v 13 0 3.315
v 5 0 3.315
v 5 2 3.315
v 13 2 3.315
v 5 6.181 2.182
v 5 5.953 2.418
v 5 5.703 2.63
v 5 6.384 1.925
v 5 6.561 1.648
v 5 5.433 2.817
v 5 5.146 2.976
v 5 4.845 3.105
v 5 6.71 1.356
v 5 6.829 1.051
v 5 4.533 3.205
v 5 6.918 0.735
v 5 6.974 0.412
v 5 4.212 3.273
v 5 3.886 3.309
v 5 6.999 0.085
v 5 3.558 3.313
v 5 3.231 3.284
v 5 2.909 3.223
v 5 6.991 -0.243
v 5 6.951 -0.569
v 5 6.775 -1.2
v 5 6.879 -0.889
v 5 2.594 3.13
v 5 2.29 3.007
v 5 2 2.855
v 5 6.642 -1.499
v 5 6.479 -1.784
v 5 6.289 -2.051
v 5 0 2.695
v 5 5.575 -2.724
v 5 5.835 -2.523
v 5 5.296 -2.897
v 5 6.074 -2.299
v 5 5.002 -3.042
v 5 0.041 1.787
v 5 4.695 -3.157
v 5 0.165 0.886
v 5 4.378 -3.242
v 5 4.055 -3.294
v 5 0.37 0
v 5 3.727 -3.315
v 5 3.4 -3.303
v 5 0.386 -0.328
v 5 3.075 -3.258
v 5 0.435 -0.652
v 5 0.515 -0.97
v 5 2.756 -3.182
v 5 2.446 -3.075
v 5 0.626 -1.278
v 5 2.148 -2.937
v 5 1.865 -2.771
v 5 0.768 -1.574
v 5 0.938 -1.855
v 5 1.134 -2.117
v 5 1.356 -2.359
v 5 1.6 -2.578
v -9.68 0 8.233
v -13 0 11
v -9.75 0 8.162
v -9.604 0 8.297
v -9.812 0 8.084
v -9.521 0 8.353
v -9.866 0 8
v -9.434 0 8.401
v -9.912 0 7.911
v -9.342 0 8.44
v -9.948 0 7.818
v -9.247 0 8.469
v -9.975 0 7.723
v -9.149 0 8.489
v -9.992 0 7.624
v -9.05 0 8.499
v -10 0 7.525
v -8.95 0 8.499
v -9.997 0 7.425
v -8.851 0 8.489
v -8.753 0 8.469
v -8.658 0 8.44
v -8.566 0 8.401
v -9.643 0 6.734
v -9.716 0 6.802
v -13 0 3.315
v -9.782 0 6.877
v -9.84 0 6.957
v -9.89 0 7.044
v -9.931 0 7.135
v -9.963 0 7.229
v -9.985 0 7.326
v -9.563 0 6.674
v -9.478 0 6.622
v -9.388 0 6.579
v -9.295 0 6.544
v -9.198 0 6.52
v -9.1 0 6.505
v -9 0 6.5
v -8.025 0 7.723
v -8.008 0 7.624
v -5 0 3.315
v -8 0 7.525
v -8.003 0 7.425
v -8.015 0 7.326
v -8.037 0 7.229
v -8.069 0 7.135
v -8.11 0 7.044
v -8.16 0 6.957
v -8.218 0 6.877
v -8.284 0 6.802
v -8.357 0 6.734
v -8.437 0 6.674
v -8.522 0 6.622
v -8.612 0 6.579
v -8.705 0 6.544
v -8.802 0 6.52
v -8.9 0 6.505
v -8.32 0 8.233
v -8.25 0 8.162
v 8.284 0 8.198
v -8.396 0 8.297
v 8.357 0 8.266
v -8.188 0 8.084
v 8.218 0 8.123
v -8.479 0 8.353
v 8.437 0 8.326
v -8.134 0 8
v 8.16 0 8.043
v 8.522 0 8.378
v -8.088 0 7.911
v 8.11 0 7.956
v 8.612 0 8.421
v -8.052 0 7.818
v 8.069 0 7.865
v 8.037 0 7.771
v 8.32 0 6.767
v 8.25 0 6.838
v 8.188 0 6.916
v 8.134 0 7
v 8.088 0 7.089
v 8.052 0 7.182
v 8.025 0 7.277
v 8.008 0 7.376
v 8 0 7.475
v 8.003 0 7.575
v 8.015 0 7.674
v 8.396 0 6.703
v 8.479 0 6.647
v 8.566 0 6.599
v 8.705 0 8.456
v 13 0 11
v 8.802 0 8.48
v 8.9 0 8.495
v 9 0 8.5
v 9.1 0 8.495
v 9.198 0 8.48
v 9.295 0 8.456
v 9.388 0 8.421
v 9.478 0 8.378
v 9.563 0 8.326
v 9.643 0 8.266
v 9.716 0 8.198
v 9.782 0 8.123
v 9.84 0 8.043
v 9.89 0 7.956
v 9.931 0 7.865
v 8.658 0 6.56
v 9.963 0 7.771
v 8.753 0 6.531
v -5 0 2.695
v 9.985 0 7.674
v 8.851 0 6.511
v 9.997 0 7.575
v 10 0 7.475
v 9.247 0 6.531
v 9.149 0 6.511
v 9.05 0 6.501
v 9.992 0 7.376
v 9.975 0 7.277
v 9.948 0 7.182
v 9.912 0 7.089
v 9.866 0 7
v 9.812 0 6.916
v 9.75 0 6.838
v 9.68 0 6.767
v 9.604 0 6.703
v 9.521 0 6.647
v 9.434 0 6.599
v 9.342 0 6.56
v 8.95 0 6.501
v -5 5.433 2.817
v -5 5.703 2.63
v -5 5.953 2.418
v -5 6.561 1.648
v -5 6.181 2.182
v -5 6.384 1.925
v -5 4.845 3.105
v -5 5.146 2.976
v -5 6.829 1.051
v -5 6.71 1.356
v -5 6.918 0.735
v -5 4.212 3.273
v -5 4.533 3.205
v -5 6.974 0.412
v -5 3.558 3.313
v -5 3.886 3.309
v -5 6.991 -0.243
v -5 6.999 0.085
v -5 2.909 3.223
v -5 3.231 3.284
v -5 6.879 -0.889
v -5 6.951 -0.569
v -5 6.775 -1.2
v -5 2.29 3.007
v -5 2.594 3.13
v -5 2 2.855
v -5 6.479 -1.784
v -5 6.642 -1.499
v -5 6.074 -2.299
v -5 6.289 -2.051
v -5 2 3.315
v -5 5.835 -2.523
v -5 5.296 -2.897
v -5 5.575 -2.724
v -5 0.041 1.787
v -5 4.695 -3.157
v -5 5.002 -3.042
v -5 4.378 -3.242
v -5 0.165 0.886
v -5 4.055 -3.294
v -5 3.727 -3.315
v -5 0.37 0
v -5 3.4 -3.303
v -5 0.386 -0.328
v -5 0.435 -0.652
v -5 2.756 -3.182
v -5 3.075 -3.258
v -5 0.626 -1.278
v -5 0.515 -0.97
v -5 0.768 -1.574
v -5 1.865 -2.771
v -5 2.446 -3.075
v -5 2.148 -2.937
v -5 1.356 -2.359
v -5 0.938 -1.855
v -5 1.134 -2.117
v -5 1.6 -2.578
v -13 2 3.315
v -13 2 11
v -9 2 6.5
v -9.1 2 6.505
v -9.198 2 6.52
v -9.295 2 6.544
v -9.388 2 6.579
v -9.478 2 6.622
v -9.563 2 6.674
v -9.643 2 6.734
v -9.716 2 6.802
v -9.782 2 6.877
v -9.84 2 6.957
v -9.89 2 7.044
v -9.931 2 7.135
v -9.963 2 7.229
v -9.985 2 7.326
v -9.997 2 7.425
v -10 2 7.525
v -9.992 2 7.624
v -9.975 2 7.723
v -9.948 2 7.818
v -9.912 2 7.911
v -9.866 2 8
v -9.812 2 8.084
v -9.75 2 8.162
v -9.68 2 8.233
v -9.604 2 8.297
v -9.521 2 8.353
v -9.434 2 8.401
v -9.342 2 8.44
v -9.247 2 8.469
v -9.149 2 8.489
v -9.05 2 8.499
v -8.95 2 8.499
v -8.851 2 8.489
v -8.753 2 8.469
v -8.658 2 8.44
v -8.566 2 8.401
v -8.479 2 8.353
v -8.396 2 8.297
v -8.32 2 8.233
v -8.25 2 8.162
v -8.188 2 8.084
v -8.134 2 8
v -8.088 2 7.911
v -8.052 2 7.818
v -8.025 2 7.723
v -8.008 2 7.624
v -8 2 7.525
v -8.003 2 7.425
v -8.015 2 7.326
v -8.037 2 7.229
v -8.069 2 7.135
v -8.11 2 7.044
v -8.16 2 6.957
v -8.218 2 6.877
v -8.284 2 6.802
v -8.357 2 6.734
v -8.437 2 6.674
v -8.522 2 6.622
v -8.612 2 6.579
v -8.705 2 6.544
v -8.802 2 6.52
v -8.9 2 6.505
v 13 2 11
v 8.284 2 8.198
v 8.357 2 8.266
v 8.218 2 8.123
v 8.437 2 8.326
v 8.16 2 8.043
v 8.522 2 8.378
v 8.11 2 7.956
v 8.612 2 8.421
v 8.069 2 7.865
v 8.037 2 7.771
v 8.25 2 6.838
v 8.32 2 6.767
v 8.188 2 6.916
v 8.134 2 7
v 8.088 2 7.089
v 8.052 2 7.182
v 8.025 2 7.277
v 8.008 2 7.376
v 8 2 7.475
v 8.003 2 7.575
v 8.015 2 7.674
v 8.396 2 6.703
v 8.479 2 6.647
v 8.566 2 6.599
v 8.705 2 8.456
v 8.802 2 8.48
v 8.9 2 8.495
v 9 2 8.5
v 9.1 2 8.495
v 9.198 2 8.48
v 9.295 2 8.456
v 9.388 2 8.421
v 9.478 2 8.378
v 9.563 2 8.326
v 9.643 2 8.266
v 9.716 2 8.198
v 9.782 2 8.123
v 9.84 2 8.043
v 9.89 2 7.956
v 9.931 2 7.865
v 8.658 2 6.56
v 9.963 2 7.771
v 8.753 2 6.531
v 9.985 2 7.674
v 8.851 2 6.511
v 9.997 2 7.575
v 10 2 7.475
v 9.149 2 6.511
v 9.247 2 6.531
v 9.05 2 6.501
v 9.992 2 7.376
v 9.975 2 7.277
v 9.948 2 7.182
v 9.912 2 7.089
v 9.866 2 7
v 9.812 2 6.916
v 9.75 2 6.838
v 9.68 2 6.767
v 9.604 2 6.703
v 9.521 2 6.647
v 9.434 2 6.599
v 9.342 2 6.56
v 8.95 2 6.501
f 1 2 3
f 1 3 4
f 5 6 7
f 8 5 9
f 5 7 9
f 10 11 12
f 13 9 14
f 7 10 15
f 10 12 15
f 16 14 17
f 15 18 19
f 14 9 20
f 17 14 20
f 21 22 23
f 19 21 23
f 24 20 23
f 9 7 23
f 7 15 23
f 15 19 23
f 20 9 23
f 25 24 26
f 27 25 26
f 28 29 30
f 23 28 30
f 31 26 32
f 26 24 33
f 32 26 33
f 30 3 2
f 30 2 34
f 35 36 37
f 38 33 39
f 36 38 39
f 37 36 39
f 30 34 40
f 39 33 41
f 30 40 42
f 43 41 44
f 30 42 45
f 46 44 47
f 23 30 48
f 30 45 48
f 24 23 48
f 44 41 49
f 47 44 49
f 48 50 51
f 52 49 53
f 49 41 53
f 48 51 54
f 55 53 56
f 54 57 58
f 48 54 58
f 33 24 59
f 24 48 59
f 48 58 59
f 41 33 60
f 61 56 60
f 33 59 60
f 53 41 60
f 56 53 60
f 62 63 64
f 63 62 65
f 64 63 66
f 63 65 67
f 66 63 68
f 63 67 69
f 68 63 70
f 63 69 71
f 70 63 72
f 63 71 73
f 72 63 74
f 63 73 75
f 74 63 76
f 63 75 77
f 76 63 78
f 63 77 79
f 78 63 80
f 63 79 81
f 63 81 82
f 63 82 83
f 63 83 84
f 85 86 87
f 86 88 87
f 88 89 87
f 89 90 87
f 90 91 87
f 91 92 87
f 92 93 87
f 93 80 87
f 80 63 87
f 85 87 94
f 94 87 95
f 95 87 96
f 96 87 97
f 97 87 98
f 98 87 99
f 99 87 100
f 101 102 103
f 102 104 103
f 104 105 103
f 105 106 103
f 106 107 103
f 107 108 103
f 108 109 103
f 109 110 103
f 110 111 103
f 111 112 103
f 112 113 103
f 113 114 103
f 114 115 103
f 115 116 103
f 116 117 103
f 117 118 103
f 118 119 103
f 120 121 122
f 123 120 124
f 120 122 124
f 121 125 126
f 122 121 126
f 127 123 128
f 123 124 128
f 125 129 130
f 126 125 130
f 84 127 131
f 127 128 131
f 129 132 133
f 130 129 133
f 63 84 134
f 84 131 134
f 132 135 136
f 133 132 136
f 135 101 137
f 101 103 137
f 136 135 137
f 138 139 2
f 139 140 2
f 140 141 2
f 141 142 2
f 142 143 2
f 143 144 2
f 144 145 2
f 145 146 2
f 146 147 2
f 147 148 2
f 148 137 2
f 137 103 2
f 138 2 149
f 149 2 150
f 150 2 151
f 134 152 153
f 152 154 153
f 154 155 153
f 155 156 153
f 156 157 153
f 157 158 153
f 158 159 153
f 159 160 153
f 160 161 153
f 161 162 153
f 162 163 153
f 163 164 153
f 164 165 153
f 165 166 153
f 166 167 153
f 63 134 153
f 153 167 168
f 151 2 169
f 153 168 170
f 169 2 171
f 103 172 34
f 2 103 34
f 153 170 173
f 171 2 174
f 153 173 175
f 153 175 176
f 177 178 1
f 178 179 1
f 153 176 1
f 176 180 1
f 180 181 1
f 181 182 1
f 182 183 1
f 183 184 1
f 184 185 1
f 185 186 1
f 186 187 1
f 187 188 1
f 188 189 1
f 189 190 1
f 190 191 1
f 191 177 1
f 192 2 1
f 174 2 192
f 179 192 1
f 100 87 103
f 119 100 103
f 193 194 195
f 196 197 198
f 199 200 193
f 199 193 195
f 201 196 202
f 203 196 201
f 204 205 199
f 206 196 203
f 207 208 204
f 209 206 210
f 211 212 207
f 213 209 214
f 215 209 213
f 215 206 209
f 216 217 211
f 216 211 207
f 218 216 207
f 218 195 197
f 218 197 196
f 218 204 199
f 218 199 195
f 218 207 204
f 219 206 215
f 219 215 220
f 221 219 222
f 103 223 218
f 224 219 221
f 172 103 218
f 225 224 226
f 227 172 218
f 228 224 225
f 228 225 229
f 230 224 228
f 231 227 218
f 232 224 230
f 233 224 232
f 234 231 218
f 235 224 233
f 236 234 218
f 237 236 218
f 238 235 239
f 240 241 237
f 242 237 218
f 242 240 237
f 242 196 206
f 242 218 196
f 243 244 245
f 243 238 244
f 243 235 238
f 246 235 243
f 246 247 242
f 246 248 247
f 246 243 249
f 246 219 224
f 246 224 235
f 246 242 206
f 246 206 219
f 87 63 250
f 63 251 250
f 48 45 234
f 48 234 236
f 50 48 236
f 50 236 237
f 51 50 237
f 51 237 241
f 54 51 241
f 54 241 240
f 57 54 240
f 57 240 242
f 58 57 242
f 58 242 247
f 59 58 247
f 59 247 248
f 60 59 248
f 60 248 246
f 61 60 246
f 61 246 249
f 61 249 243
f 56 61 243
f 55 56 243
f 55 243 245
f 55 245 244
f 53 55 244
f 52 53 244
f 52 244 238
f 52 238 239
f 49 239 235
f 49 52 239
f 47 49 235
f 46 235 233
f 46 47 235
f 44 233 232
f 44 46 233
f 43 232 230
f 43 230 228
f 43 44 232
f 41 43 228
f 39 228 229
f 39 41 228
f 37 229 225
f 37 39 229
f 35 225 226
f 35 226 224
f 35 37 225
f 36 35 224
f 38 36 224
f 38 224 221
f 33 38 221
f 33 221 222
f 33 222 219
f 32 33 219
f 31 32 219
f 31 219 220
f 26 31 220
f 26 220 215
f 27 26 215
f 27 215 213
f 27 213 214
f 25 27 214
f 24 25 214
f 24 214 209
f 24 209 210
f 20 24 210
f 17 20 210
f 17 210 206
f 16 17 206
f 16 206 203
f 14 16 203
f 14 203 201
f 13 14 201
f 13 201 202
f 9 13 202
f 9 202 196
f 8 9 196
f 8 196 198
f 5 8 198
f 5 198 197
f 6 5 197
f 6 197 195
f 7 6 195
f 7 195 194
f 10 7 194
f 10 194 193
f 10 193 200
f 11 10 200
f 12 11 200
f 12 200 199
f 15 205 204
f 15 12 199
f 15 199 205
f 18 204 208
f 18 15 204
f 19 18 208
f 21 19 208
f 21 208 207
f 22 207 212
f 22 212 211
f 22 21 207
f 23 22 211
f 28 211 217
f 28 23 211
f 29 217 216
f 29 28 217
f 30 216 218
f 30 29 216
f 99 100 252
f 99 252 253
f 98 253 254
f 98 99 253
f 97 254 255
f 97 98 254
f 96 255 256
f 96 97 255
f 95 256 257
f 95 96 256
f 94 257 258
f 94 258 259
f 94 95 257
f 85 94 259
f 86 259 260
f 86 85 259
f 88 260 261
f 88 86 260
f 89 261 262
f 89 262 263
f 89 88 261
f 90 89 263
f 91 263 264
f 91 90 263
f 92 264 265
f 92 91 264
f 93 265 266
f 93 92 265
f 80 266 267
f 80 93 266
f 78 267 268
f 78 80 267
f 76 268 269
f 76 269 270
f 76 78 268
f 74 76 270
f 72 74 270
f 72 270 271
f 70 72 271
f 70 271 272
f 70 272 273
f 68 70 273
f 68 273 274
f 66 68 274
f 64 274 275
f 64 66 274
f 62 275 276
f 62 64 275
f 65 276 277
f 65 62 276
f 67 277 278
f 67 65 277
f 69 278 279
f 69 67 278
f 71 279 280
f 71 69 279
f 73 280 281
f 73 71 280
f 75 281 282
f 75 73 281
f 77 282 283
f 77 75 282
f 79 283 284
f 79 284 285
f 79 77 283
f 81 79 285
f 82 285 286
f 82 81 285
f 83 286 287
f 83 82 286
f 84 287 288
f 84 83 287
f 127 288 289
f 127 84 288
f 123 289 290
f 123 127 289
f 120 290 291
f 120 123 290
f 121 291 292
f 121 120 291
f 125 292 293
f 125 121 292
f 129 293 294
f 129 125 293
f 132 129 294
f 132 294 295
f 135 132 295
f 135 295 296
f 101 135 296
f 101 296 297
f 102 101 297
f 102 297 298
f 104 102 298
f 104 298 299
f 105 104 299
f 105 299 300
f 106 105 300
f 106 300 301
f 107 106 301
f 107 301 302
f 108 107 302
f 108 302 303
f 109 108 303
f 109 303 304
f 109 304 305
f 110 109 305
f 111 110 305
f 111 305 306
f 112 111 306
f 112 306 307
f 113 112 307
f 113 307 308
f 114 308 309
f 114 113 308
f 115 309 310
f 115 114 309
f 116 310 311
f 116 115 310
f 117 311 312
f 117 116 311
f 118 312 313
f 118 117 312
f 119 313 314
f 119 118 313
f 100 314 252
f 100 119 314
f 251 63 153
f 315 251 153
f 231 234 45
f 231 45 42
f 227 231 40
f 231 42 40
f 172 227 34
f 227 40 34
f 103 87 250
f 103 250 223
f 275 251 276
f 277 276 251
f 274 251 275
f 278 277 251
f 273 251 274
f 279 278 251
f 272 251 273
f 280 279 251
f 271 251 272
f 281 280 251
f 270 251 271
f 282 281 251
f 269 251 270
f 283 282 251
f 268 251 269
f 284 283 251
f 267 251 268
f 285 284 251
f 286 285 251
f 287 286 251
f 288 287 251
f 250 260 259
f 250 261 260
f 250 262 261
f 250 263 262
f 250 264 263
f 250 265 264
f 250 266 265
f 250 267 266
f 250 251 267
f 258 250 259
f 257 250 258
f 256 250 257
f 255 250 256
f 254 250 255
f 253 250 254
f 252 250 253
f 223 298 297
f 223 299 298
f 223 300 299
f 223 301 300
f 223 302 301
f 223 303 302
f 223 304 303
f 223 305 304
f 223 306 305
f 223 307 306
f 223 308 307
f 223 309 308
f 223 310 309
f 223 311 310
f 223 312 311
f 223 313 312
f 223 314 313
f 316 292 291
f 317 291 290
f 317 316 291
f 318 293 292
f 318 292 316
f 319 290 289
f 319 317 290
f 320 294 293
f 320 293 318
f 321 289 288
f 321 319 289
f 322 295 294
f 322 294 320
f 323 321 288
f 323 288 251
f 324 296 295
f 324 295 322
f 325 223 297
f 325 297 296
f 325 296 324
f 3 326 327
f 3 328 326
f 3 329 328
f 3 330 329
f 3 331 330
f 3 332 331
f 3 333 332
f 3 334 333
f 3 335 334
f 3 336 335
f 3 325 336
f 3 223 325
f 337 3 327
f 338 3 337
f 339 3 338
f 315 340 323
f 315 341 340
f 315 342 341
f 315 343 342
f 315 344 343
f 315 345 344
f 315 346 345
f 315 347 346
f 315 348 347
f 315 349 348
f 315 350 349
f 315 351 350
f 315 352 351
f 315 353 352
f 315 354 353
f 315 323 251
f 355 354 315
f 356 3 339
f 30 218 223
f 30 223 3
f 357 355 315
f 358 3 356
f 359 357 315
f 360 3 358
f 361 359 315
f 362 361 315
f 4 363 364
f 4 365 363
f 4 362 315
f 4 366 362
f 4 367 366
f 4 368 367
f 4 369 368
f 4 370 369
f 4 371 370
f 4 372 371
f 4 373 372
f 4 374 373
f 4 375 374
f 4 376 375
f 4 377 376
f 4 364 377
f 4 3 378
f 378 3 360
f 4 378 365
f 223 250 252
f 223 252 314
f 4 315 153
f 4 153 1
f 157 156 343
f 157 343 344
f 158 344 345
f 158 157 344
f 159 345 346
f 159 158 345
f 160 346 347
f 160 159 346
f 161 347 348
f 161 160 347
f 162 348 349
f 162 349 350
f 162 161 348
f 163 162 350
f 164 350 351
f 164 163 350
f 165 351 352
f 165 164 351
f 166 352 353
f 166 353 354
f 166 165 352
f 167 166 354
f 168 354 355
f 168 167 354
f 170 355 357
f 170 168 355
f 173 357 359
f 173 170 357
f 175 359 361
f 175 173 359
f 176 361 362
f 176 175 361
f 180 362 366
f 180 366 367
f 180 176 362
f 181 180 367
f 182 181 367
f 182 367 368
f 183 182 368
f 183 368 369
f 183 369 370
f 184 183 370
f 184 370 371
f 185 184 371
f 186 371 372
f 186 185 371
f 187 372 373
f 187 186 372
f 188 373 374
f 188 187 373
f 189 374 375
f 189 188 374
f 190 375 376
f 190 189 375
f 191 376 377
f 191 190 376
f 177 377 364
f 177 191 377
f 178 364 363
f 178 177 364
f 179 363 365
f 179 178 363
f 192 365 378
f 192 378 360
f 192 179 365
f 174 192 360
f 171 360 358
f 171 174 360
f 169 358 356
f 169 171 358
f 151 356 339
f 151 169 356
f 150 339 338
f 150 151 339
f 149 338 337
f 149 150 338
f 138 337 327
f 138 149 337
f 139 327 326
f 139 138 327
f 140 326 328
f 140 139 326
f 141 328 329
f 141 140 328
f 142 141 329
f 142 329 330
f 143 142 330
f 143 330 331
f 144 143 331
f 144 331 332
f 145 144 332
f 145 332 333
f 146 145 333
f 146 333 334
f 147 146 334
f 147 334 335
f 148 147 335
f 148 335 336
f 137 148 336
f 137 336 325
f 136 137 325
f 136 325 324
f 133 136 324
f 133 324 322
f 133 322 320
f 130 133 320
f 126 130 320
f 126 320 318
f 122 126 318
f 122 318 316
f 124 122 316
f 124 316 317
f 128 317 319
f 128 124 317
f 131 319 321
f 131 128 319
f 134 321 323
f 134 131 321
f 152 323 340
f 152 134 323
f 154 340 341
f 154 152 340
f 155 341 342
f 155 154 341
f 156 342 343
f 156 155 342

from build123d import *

# Parameters (mm, degrees)
SKETCH_1_W               = 26
SKETCH_1_H               = 11
SKETCH_1_R               = 1
EXTRUDE_1_DEPTH          = 2
SKETCH_2_R               = 3.315
EXTRUDE_2_DEPTH          = 26
FILLET_1_R               = 10
CUT_EXTRUDE_1_DEPTH      = 18.748239349
CUT_EXTRUDE_1_DEPTH_BACK = 18.748239349
SKETCH_3_W               = 8
SKETCH_3_H               = 6.63


with BuildPart() as part:
    # 草图1 → 凸台-拉伸1 (new body)
    with BuildSketch(Plane(origin=(0, 0, 0), x_dir=(1, 0, 0), z_dir=(0, 1, 0))):
        with Locations((0, -5.5)):
            Rectangle(SKETCH_1_W, SKETCH_1_H)
        with Locations(Location((9, -7.5, 0), (0, 0, 270))):
            Circle(SKETCH_1_R, mode=Mode.SUBTRACT)
        with Locations(Location((-9, -7.5, 0), (0, 0, 90))):
            Circle(SKETCH_1_R, mode=Mode.SUBTRACT)
    extrude(amount=EXTRUDE_1_DEPTH)

    # 草图2 → 凸台-拉伸2 (add)
    with BuildSketch(Plane(origin=(13, 0, 0), x_dir=(0, 0, -1), z_dir=(1, 0, 0))):
        with Locations((0, 3.685)):
            Circle(SKETCH_2_R)
    extrude(amount=-EXTRUDE_2_DEPTH)

    # 圆角1
    # the kernel refuses this fillet: 10 mm, written as the material it takes off along each edge
    with BuildSketch(Plane(origin=(19.737534787, 0, 0), x_dir=(0, 1, 0), z_dir=(-1, 0, 0))) as fillet_1_piece_1:
        with BuildLine():
            CenterArc((10, -2.695013915), FILLET_1_R, 164.365401099, 15.634598901)
            Line((0, -2.695013915), (-0.2, -2.695013915))
            Line((-0.2, -2.695013915), (-0.2, 0))
            Line((-0.2, 0), (0, 0.2))
            ThreePointArc((0, 0.2), (0.185, 0.2), (0.1774, 0.053900278))
            Line((0.1774, 0.053900278), (0.37, 0))
        make_face()
    extrude(amount=39.475069573, mode=Mode.SUBTRACT)

    # 草图3 → 切除-拉伸1 (cut, two sides: drawn at the far end of the back side and taken through both)
    with BuildSketch(Plane(origin=(0, 2, 0), x_dir=(1, 0, 0), z_dir=(0, 1, 0)).offset(-CUT_EXTRUDE_1_DEPTH_BACK)):
        with Locations((9, 0)):
            Rectangle(SKETCH_3_W, SKETCH_3_H)
        with Locations((-9, 0)):
            Rectangle(SKETCH_3_W, SKETCH_3_H)
    extrude(amount=CUT_EXTRUDE_1_DEPTH + CUT_EXTRUDE_1_DEPTH_BACK, mode=Mode.SUBTRACT)


solid = part.part
